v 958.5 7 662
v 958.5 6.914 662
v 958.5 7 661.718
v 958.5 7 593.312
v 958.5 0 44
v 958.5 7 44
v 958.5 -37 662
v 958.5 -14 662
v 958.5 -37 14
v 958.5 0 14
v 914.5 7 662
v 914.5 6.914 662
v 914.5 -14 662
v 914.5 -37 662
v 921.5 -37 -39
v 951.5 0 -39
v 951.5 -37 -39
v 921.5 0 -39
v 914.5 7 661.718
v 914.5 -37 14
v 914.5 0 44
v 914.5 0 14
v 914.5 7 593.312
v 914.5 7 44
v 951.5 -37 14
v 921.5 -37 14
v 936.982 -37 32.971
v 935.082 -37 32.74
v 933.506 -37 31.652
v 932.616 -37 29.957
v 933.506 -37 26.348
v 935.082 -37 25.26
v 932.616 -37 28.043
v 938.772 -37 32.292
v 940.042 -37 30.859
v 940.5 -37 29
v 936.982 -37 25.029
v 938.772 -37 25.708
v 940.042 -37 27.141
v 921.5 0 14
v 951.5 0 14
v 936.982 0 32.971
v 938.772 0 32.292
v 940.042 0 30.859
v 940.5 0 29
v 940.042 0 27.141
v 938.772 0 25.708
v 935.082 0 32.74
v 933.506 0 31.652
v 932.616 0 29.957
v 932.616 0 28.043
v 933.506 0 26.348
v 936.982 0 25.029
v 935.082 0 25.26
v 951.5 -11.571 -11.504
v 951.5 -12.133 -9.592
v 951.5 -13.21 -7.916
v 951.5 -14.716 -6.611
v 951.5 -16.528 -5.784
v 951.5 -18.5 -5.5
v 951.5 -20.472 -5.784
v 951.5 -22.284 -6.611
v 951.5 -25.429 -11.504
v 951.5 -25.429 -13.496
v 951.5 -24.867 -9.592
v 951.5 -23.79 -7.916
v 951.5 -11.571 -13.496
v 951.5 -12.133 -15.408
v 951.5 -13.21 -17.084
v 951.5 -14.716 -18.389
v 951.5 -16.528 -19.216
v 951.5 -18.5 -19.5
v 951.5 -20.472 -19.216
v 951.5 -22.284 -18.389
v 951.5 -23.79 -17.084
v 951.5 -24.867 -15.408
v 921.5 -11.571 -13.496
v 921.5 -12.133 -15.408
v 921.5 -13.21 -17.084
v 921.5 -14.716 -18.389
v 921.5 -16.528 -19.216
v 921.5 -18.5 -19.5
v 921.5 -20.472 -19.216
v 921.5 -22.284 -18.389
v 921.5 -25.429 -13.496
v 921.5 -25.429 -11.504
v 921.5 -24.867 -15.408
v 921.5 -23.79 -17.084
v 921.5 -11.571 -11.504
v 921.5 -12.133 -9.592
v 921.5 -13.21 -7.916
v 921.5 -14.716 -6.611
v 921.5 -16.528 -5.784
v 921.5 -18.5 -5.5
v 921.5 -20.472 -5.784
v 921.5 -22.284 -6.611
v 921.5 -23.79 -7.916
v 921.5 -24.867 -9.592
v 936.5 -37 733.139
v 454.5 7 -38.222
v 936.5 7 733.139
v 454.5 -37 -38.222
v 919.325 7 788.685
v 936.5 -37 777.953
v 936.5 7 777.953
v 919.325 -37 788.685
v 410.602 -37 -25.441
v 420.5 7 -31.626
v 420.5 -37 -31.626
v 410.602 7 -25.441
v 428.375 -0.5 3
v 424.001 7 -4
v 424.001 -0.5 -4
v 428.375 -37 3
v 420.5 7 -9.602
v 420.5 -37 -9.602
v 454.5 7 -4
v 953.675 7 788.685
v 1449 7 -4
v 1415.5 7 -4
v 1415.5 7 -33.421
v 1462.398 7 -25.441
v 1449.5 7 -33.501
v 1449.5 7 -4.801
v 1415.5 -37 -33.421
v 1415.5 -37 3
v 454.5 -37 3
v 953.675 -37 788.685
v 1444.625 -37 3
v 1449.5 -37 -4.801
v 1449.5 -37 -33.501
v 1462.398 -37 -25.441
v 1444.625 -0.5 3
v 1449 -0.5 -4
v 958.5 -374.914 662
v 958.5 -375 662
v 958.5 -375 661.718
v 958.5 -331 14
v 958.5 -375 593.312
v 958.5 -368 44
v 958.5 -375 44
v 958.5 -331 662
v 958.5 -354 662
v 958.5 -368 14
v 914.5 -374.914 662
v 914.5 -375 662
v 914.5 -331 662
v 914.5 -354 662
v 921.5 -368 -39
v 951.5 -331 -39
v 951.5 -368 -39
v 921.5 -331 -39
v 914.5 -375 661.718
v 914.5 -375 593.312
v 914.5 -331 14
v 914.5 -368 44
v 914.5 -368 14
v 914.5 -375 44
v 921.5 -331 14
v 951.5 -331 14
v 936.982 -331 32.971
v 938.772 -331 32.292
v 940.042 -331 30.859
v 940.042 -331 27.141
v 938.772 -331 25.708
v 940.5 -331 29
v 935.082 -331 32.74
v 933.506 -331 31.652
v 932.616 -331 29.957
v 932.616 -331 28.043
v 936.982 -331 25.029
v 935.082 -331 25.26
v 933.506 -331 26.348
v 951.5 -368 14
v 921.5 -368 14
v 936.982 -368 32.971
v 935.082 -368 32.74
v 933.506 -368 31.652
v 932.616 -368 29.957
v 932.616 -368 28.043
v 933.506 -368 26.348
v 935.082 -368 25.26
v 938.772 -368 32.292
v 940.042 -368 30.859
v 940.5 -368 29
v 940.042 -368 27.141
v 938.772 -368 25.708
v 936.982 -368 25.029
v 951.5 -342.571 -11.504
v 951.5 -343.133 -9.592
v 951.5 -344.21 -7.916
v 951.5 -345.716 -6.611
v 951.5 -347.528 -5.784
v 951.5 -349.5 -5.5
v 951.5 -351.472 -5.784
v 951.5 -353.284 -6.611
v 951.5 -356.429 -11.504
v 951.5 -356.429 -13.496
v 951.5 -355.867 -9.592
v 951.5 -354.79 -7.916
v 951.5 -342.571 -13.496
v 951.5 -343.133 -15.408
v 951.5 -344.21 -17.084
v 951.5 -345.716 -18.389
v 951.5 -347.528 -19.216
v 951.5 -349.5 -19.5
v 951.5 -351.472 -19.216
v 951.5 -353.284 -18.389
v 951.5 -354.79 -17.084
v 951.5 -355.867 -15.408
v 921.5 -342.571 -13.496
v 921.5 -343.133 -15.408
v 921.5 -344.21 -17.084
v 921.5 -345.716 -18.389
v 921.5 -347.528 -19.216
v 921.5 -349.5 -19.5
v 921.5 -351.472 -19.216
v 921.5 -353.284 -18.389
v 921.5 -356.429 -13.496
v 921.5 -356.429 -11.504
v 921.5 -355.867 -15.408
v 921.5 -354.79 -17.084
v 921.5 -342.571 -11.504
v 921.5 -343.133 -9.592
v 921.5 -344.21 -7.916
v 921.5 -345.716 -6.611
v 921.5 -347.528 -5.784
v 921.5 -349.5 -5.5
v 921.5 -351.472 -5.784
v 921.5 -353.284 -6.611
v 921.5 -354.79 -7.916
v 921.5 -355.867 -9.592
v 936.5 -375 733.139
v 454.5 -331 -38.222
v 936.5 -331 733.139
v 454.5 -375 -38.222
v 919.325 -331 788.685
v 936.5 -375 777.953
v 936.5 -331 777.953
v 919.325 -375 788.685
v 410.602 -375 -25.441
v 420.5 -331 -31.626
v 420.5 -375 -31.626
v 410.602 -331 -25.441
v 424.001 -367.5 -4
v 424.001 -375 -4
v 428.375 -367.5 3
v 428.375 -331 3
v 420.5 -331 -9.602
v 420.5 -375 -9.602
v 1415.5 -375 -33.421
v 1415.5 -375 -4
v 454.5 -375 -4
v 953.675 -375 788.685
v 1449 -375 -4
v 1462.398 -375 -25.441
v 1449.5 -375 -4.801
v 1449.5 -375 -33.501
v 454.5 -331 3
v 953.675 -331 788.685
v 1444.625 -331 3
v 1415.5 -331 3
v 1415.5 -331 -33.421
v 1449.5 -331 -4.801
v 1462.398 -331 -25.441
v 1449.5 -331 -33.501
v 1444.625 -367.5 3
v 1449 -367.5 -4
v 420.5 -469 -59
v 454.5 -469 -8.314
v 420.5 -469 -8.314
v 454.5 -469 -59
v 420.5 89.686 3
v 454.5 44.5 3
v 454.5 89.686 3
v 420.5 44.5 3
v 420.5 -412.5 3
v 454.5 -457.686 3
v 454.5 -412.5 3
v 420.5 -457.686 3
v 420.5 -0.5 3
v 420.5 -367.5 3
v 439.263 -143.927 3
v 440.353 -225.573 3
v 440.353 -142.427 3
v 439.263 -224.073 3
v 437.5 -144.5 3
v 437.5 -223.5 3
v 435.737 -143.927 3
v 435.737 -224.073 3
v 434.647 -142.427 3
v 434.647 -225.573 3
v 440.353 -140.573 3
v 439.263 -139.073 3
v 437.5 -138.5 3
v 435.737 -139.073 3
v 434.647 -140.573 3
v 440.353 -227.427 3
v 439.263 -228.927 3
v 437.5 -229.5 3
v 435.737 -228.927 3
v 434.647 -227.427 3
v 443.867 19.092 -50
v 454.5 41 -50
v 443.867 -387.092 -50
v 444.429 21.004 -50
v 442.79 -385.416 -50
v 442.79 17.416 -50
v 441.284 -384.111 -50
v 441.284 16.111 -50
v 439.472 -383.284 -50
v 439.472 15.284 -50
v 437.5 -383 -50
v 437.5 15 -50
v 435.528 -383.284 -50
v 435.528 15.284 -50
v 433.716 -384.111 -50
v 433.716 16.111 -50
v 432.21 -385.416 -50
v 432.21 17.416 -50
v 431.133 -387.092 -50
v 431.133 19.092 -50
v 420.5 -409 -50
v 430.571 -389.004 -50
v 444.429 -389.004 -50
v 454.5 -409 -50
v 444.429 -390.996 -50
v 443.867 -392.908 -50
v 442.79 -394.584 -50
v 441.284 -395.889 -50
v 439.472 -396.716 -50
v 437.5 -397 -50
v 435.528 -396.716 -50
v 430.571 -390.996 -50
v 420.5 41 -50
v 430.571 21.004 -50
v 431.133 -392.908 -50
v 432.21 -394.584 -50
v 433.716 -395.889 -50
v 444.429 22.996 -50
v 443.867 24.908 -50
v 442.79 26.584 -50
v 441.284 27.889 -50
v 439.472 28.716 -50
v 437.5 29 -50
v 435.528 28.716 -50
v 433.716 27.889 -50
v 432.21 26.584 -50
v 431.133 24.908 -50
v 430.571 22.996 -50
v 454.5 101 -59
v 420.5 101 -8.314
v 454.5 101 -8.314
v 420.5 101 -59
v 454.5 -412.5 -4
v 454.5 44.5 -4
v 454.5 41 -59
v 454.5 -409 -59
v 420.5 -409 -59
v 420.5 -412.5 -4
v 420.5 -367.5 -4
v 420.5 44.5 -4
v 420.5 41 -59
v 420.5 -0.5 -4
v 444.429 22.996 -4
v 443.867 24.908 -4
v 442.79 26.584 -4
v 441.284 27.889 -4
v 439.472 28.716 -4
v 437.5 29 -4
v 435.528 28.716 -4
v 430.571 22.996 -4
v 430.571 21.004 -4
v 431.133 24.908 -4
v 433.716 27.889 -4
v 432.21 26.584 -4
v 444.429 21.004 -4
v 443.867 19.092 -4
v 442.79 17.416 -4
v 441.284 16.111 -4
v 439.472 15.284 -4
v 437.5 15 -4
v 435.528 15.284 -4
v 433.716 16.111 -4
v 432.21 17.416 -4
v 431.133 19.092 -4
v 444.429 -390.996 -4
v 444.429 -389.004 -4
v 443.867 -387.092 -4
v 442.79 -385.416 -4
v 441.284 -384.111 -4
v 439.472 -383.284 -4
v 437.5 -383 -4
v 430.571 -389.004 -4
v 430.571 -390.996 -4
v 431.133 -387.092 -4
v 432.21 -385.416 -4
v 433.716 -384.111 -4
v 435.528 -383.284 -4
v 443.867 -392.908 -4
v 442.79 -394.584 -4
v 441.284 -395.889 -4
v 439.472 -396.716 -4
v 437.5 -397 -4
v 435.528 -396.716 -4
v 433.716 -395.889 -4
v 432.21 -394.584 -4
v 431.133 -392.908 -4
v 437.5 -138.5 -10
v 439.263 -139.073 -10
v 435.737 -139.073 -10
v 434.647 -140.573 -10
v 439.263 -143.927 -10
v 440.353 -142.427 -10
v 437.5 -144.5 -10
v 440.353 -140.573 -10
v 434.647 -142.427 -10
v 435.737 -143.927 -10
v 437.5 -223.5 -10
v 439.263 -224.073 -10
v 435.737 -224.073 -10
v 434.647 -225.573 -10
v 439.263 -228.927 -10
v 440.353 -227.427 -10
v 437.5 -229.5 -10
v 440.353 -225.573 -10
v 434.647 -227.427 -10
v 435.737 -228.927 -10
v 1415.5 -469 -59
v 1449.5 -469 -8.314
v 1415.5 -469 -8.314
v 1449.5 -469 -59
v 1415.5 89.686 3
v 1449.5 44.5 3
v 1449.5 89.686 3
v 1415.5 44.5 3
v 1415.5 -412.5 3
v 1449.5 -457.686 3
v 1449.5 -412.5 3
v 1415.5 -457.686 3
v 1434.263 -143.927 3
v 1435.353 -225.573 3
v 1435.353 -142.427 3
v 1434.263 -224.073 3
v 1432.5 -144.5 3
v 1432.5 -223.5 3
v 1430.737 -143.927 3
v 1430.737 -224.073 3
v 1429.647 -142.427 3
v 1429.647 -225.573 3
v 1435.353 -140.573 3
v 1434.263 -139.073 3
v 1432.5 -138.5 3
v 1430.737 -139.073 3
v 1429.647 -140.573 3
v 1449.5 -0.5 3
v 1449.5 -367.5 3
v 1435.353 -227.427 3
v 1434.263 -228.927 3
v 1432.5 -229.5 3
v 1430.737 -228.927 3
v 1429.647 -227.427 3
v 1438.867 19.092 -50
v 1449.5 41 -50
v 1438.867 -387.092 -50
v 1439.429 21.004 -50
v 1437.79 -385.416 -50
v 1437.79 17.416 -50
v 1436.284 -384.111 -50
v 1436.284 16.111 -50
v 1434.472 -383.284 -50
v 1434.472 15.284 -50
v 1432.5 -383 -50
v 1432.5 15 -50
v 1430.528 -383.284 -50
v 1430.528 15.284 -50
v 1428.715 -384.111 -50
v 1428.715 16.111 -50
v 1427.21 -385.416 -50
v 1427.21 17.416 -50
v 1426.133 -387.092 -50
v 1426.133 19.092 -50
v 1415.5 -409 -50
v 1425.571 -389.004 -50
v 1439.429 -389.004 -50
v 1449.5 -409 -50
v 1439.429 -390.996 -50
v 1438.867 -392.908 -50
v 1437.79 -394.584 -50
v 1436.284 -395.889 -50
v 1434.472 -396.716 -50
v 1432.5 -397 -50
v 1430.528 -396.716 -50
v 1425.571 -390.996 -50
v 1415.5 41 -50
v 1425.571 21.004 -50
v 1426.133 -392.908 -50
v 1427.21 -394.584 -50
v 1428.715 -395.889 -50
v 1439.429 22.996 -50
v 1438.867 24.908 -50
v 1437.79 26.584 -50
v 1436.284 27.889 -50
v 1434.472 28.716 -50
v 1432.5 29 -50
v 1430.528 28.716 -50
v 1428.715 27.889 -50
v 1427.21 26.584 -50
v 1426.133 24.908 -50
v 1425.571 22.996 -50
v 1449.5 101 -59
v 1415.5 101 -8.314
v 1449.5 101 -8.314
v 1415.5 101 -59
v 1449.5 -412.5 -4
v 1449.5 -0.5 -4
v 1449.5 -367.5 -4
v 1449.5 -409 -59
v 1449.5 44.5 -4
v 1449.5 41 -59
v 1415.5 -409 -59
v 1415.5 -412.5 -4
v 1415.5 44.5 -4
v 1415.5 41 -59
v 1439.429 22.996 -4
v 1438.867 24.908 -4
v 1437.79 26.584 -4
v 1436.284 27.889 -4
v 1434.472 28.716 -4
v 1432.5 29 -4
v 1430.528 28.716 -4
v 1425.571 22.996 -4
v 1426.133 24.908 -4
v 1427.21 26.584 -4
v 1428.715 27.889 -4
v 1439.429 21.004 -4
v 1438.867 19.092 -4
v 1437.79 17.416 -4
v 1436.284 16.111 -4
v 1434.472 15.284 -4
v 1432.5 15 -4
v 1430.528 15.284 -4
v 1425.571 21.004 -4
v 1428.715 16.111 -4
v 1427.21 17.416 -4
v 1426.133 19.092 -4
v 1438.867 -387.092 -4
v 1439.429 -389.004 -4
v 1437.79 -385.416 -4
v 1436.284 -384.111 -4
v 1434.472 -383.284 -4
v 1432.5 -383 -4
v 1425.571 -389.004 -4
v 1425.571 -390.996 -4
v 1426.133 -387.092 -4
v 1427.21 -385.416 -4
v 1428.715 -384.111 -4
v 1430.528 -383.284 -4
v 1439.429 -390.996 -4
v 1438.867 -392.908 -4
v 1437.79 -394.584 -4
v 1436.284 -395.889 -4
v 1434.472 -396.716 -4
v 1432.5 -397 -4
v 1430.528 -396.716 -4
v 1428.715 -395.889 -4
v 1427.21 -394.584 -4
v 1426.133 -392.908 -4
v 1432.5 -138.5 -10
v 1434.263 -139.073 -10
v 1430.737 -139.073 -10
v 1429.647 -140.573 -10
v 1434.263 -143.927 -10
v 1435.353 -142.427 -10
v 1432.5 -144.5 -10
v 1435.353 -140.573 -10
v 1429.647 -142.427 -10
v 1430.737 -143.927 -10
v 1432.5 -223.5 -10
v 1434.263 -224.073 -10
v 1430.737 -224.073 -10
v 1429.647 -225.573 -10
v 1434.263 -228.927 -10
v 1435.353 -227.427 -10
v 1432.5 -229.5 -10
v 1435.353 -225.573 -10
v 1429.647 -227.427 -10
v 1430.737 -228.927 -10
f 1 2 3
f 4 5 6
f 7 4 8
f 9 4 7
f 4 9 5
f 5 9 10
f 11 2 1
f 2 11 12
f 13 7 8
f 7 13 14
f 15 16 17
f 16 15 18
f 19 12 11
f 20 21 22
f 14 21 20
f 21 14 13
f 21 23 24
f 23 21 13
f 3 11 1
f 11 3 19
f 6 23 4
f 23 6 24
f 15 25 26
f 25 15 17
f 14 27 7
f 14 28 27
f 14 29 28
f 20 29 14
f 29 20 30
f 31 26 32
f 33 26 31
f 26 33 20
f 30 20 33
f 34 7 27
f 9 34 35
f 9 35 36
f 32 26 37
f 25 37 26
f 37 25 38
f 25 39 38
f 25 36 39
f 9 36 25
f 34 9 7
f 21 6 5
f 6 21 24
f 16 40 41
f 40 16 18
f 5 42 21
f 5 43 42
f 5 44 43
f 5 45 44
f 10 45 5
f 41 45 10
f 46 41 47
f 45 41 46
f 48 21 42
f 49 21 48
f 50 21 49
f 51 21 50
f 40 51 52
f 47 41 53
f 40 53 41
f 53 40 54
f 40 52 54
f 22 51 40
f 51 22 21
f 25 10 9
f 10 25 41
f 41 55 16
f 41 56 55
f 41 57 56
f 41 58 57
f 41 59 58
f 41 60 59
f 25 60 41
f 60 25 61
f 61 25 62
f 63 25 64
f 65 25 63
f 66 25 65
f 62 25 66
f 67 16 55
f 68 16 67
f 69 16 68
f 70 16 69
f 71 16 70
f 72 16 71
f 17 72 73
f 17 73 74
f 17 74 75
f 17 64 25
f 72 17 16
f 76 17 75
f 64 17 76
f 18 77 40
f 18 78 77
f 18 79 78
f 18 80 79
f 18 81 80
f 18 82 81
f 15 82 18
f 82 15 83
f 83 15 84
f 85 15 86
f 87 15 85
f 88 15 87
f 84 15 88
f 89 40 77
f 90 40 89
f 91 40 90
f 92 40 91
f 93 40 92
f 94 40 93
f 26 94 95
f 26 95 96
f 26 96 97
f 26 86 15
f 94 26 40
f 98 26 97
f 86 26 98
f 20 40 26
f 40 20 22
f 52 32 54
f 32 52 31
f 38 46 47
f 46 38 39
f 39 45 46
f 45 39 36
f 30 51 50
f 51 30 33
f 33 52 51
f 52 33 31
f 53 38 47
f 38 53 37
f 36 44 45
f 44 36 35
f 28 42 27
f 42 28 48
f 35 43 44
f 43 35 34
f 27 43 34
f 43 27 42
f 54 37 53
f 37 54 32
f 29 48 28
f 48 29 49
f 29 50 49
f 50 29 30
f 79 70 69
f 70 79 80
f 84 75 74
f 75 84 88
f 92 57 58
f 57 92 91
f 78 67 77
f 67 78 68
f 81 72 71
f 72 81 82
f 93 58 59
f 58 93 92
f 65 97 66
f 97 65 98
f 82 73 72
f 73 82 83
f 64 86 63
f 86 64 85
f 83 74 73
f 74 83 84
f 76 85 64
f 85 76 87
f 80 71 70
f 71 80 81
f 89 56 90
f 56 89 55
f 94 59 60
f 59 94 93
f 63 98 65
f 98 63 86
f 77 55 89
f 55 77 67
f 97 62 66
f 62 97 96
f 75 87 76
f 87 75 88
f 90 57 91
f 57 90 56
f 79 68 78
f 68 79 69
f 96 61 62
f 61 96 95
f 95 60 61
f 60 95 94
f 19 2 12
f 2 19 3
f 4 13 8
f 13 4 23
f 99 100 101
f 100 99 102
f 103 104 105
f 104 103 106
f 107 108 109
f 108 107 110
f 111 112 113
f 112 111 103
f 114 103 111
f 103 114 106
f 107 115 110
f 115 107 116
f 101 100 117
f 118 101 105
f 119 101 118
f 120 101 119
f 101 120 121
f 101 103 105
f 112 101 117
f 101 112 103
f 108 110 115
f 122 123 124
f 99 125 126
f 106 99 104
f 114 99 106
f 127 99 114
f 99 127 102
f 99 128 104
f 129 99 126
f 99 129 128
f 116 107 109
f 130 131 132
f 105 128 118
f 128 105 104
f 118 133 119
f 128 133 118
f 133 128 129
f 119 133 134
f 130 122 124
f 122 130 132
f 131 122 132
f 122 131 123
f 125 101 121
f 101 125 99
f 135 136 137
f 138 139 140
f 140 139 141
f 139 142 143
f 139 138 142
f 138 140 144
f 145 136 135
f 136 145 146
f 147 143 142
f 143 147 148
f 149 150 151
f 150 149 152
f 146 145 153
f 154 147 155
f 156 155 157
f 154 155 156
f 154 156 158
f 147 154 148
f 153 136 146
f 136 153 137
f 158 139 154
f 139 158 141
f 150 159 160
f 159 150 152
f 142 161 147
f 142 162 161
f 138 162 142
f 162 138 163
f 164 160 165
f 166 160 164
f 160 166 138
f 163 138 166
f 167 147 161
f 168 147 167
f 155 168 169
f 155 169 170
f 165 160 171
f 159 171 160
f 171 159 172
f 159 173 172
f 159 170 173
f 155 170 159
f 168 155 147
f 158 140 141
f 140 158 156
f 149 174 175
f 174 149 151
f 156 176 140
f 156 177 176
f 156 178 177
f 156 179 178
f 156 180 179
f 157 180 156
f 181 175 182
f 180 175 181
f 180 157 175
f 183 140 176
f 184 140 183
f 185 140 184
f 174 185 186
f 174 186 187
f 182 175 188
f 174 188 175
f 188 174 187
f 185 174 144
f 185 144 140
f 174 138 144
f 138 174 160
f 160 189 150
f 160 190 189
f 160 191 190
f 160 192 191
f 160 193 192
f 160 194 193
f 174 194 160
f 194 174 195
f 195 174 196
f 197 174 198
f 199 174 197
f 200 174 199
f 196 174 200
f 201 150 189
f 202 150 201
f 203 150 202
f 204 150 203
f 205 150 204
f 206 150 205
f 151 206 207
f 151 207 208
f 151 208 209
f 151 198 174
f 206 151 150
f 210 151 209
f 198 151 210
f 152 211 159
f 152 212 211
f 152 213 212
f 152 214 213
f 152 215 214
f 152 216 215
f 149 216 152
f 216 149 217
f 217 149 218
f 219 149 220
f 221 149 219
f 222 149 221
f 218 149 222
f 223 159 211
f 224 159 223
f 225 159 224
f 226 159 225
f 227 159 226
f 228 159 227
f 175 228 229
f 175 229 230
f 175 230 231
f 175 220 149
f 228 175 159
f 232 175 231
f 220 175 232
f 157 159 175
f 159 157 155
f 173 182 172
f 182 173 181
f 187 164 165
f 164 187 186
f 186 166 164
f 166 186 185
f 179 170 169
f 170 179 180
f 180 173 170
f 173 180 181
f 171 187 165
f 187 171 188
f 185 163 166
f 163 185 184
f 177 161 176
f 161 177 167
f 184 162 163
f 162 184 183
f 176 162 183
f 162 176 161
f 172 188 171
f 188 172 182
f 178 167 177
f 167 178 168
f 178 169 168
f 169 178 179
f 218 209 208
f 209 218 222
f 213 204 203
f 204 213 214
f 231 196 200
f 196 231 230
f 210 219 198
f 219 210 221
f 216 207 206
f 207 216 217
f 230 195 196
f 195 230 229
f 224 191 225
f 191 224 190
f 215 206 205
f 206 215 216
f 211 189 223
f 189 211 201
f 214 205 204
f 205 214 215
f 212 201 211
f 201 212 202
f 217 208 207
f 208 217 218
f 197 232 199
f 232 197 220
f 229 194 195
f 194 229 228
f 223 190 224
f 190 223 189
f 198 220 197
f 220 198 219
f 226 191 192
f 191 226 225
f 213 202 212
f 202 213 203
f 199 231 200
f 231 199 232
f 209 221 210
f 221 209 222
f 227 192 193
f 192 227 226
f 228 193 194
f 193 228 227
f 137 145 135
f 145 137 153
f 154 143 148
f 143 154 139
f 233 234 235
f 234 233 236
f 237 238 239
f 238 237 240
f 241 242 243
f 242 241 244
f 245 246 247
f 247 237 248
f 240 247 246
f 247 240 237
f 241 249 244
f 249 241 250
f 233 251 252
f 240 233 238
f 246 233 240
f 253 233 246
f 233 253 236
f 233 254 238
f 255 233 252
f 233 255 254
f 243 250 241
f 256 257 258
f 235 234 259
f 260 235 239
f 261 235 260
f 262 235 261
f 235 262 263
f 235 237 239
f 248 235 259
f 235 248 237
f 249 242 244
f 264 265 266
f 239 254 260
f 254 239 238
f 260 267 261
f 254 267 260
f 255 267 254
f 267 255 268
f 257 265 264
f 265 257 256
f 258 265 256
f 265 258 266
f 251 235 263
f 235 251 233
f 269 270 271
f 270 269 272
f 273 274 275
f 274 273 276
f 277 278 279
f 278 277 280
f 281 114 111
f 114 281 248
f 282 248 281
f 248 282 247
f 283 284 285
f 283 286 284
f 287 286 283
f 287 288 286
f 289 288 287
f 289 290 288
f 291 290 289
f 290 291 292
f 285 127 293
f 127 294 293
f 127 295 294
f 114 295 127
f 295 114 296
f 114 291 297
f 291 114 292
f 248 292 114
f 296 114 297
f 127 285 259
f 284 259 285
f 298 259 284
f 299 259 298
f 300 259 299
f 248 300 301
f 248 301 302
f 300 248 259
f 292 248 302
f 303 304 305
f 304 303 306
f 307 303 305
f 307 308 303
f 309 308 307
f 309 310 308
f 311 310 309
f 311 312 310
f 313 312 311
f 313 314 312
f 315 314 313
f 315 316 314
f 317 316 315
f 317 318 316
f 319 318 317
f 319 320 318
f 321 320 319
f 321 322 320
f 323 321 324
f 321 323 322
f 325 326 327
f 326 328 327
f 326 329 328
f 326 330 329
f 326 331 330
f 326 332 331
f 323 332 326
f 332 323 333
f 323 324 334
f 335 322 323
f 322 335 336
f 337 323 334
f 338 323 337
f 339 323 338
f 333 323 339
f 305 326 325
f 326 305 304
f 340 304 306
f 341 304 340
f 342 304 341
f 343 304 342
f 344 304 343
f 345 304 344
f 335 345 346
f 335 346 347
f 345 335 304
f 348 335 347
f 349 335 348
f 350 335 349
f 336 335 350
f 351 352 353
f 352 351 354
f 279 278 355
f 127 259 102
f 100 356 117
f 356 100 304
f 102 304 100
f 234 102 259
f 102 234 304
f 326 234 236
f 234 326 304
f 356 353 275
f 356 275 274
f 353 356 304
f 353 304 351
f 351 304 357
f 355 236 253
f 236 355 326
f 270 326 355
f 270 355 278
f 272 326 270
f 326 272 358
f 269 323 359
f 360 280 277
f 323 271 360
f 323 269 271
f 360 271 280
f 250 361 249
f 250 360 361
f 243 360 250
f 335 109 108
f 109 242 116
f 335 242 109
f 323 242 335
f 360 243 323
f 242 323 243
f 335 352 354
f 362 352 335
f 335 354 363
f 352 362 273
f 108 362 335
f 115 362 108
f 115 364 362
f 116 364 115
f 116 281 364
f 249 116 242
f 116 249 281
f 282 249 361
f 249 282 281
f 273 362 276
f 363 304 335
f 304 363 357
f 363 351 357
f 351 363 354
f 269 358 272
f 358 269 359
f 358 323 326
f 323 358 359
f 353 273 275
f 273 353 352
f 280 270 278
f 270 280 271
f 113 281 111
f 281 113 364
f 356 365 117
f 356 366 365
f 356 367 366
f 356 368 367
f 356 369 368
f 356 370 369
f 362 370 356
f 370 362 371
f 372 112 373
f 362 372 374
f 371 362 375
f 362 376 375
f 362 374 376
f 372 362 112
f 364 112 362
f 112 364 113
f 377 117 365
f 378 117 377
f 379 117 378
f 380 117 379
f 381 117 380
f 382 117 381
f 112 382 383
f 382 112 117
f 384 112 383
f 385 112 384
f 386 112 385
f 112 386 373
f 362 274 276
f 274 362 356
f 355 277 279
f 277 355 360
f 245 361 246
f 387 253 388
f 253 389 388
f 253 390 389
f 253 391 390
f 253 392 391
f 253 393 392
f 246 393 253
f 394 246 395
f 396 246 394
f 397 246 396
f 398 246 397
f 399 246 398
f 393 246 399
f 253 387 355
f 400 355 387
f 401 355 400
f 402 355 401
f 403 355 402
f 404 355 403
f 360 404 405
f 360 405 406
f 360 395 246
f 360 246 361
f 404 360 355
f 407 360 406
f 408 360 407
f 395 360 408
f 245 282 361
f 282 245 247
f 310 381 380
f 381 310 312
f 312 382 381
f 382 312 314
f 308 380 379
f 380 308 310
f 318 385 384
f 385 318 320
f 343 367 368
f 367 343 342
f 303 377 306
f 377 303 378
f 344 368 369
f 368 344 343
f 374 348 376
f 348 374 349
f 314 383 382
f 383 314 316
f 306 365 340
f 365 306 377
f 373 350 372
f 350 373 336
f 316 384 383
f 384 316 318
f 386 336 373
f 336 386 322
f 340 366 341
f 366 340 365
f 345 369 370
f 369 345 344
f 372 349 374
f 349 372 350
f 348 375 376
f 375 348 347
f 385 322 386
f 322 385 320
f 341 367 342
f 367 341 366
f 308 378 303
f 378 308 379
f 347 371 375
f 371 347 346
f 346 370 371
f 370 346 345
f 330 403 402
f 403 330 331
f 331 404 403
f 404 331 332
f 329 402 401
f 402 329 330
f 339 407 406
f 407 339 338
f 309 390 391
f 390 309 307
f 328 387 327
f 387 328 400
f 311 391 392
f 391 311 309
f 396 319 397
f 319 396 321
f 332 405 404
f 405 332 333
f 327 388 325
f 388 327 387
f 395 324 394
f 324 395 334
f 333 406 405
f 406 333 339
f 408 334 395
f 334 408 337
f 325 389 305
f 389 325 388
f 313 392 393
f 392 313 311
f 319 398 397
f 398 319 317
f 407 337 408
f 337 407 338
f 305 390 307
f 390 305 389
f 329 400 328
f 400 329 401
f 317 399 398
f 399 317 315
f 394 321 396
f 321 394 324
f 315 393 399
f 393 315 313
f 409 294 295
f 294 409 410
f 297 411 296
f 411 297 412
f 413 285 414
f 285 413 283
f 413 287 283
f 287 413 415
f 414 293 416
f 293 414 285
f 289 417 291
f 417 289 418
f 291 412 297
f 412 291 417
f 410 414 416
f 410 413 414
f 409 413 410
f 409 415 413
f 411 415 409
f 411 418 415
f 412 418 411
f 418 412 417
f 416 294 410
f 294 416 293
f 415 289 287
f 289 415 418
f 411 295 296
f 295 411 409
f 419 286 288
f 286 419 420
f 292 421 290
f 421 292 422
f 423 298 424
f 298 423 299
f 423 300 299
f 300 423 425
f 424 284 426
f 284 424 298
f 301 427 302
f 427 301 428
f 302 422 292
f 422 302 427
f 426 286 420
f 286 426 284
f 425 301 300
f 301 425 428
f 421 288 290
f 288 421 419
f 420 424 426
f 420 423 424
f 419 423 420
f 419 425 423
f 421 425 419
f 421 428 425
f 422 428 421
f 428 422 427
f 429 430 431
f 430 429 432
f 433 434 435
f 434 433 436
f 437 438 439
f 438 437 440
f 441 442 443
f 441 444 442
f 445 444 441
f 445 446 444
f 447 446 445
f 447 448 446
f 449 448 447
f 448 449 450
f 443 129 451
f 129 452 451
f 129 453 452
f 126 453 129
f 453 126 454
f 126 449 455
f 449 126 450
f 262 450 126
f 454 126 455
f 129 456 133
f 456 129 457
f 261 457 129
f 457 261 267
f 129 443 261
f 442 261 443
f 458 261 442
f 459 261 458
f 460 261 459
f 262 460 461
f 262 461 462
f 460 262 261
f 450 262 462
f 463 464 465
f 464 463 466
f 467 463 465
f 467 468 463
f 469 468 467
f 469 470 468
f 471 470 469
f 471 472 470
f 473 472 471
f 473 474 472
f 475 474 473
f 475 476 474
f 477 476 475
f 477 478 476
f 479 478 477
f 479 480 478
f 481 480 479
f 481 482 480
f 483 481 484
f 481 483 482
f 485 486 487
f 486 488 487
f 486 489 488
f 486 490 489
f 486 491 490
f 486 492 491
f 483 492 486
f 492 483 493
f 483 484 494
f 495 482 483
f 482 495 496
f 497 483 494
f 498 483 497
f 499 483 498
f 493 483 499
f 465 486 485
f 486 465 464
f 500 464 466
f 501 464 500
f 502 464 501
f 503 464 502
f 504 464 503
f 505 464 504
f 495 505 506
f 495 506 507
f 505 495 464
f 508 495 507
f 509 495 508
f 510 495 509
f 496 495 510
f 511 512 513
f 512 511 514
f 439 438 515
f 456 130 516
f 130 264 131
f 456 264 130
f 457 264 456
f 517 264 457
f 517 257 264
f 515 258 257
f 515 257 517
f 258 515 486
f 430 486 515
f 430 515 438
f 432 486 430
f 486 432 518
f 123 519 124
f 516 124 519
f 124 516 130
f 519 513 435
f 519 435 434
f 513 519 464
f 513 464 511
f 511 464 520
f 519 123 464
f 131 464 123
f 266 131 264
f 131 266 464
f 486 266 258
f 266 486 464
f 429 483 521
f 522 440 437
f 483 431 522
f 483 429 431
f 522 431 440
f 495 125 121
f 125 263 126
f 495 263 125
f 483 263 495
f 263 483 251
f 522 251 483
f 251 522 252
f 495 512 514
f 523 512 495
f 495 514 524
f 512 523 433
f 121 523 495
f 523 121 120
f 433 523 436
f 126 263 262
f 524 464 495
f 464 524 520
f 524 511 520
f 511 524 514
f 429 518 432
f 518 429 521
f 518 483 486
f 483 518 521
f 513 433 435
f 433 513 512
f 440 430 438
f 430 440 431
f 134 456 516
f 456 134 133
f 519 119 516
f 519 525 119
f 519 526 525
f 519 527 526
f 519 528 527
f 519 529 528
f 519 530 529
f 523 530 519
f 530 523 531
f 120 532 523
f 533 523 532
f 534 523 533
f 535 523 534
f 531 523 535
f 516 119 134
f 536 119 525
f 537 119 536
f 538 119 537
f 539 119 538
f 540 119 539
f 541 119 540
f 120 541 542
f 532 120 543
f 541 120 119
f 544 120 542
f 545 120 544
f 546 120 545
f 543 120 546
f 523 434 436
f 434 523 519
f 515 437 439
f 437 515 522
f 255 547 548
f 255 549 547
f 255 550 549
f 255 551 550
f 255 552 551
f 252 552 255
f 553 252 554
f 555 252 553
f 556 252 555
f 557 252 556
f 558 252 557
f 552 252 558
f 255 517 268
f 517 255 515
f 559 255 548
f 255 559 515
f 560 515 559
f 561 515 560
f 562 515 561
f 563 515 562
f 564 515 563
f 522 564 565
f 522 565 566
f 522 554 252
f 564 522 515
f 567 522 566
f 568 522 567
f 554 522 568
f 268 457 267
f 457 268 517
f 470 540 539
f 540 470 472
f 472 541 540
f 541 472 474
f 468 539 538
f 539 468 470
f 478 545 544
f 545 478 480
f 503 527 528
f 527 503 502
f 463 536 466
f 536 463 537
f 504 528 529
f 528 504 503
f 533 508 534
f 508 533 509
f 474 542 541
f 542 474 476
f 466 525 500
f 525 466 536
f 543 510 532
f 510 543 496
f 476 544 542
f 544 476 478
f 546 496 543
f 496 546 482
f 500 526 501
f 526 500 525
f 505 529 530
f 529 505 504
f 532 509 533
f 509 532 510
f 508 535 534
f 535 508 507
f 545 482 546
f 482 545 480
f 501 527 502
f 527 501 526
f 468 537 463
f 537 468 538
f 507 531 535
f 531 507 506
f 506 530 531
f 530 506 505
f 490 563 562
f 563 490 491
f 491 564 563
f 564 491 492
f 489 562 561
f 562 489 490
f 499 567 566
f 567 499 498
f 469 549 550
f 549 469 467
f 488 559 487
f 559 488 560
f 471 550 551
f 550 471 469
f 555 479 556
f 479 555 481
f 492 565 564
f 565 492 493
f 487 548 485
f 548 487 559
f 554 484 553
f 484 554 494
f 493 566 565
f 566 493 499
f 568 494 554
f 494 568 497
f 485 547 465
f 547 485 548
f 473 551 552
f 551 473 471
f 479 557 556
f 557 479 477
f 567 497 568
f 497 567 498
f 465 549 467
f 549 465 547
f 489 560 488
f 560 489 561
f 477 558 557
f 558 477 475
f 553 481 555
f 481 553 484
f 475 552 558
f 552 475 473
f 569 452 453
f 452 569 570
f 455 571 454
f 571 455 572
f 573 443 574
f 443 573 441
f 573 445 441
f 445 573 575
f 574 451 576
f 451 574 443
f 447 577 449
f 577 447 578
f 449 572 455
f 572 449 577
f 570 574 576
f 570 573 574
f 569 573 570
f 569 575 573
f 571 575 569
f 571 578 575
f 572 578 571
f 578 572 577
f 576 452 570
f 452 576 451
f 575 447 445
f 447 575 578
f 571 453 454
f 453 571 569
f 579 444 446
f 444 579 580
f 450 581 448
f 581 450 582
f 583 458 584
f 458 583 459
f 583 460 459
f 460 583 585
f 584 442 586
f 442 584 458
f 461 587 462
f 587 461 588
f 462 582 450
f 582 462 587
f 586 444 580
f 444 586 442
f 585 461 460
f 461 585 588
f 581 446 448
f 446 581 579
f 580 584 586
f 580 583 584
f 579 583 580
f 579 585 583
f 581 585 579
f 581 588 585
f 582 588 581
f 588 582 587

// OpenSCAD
// (c) 2014 juewei@fabfolk.com
// GPLv2.0 or ask.

frame_width=412;
bar_l1=570;
bar_l2=980;
side_x=220;
side_alpha=17;
side_beta=32;
x1=(bar_l1-frame_width)/2;
x2=(bar_l2-frame_width)/2;
d1=8;		// bolt diameter for gluing struts

side_x_center =   (988+885)/2;
center_pocket_w =  988-885;
pocket_depth = 	7;
explode = 0;		// descend all the bottom bars

module rcube_xy(size, radius) 
{
  x = size[0];
  y = size[1];
  z = size[2];

  linear_extrude(height=z) hull() 
    {
      translate([radius, radius, 0])
      circle(r=radius);

      translate([x - radius, radius, 0])
      circle(r=radius);

      translate([x - radius, y - radius, 0])
      circle(r=radius);

      translate([radius, y - radius, 0])
      circle(r=radius);
    }
}

module lower_beam()
{
  lhl=1500;	// length of lower beam 
  difference()
    {
      cube([lhl,44,44]);		// lower lengthwise beam
      // cut back edges
                            rotate([0,-45,0])  translate([0,-10,-10]) cube([8,60,20]);
      translate([0,0,45])   rotate([0,45,0])   translate([0,-10,-10]) cube([8,60,20]);
      translate([lhl,0,45]) rotate([0,135,0])  translate([0,-10,-10]) cube([8,60,20]);
      translate([lhl,0,0])  rotate([0,-135,0]) translate([0,-10,-10]) cube([8,60,20]);
    
      // hole for rear round bar
      rotate([-90,0,0]) translate([45,-22,-10]) cylinder(60,8,8); 

      // Pocket for bottom bar rear
      translate([420, -10, -10]) cube([35, 60, 10+pocket_depth]);
      // Hole for bottom bar rear	
      translate([420+35/2, 22, 0]) cylinder(50, 7,7);
      // 480?? Hole for bolting rear strut
      rotate([-90,0,0]) translate([480,-22,-10]) cylinder(60,d1/2,d1/2); 

      // Pocket for bottom bars center
      translate([side_x_center-center_pocket_w/2, -10, -10]) cube([center_pocket_w, 60, 10+pocket_depth]);		
      // hole for bolting center post
      rotate([-90,0,0]) translate([side_x_center,-22-pocket_depth,-10]) cylinder(60,d1/2,d1/2);     

      // Pocket for bottom bar front
      translate([1415, -10, -10]) cube([35, 60, 10+pocket_depth]);
      // Hole for bottom bar front	
      translate([1415+37/2, 22, 0]) cylinder(50, 7,7);
      // 1400?? Hole for bolting front strut
      rotate([-90,0,0]) translate([1400,-22,-10]) cylinder(60,d1/2,d1/2); 
    }
}

module wedge15(len)
{
  difference()
    {
      rotate([0,-15,0]) translate([0,0,-44]) cube([len,44,44]);
      translate([0,-10,-44]) cube([2*len, 60,44]);
    }
}

module side_support()
{
  lss=1248;	// Length side support
  d1=8;		// bolt diameter for gluing struts
  translate([-lss,0,0]) difference()
    {
      union()
        {
          cube([lss,44,44]);		// side support
          translate([0,0,44.2]) wedge15(106);  //hypothenusis=110
          translate([413,0,44.2]) wedge15(92); //hypothenusis=95
		
        }
      // Hole for main shaft
      rotate([0,-side_alpha,0]) translate([60,22,-30]) cylinder(100,8,8); 
      
      // Slanted ends
      translate([0,0,44])  rotate([0,180-side_alpha,0]) translate([0,-10,-10]) cube([15,60,60]);
      translate([lss,0,0]) rotate([0,-side_alpha,0])    translate([0,-10,-10]) cube([15,60,60]);

      // Hole for upper triangle bolt
      rotate([-90,0,0]) translate([472,-38,-10]) cylinder(60,7,7); 

      // pockets for bottom center bars
      translate([1193,-10, 0]) rotate([0,-side_alpha,0]) translate([0,0,-20]) cube([60,10+pocket_depth,80]);
      translate([1193,44-7,0]) rotate([0,-side_alpha,0]) translate([0,0,-20]) cube([60,10+pocket_depth,80]);

      // Hole for bottom center bars bolt
      rotate([-90,0,0]) translate([1214,-22,-10]) cylinder(60,7,7); 
    }
}

module bottom_center_bar()
{
  xc1 = bar_l2/2-frame_width/2;
  xc2 = bar_l2/2+frame_width/2;
  difference()
    {
      cube([bar_l2,34,53]);

      // cut back edges
      translate([0,     0,53]) rotate([0,45,0])   translate([0,-10,-10]) cube([8,60,20]);
      translate([bar_l2,0,53]) rotate([0,135,0])  translate([0,-10,-10]) cube([8,60,20]);
      
      // lower beam pockets
      translate([x2-45/2,            -10,53-7]) cube([45, 60, 10+pocket_depth]);
      translate([x2-45/2+frame_width,-10,53-7]) cube([45, 60, 10+pocket_depth]);

      // holes for center posts
      rotate([-90,0,0]) translate([xc1+(44+44-pocket_depth)/2, -53/2,-10]) cylinder(60,7,7); 
      rotate([-90,0,0]) translate([xc2-(44+44-pocket_depth)/2, -53/2,-10]) cylinder(60,7,7); 

      // holes for side supports
      rotate([-90,0,0]) translate([x2-side_x+8,            -53/2,-10]) cylinder(60,7,7); 
      rotate([-90,0,0]) translate([x2+frame_width+side_x-8,-53/2,-10]) cylinder(60,7,7); 

    }
}

module bottom_bar()
  {
    x2=(bar_l1-85)/2;
    difference()
      {
	union()
	  {
	    cube([bar_l1,34,53]);
	    translate([0,0,-9]) cube([60,34,9]);
	    translate([bar_l1-60,0,-9]) cube([60,34,9]);
	  }
	// cut back edges
	translate([0,     0,53]) rotate([0,45,0])   translate([0,-10,-10]) cube([8,60,20]);
	translate([bar_l1,0,53]) rotate([0,135,0])  translate([0,-10,-10]) cube([8,60,20]);

	// beam pockets
	translate([x1-45/2,            -10,53-pocket_depth]) cube([45,50,10+pocket_depth]);
	translate([x1-45/2+frame_width,-10,53-pocket_depth]) cube([45,50,10+pocket_depth]);

	// beam holes
	translate([x1,            34/2,-10]) cylinder(60,7,7); 
	translate([x1+frame_width,34/2,-10]) cylinder(60,7,7); 

	// pin holes for slide
	translate([x2,34/2,   40]) cylinder(25,3,3); 
	translate([x2+85,34/2,40]) cylinder(25,3,3); 
      } 
  }

module triangle_post()
{
    translate([0,-44+pocket_depth,-30]) cube([44,44,960]);
}

module center_post()
  {
    h=618;
    difference()
      {
	translate([0,-44+pocket_depth,-53+2*pocket_depth]) cube([44,44,h+44-2*pocket_depth+53]);

	// three sides pockets at the bottom end:
	translate([-10,0,-53+2*pocket_depth-10]) cube([44+10+10,pocket_depth+10,53+44-2*pocket_depth+10]);
	translate([-pocket_depth+44,-44-10,-53+2*pocket_depth-10]) cube([pocket_depth+10,44+10+10,53+10]);
	translate([-10,-44-10,-53+2*pocket_depth-10]) cube([pocket_depth+10,44+10+10,53+10]);

        // hole for bolting center post, glued to lower_beam.
        rotate([-90,0,0]) translate([22,-22-pocket_depth,-44]) cylinder(60,d1/2,d1/2);     

        // hole for bolting center post with center bottom bars
        translate([-10, -(44-pocket_depth)/2, -53/2+2*pocket_depth]) rotate([0,90,0]) cylinder(60,7,7); 

	// tapered top
	translate([-10,-44+pocket_depth+23,h+44]) rotate([-90+side_alpha,0,0]) cube([60,80,20]);
      }
  }


module side_triangle()
{
  tri_width = 510;
  union()
    {
      %lower_beam();
      translate([side_x_center-tri_width,0,0])                 rotate([0,side_beta,0]) triangle_post();
      translate([side_x_center+tri_width,0,0]) scale([-1,1,1]) rotate([0,side_beta,0]) triangle_post();
      translate([side_x_center-22,0,0]) rotate([0,00,0]) center_post();
    }
}


#side_triangle();
translate([0,-frame_width+44,0]) scale([1,-1,1]) side_triangle();

translate([420.5,x1+44/2,-50]) rotate([0,0,-90]) bottom_bar();  // rear bar
translate([1415.5,x1+44/2,-50]) rotate([0,0,-90]) bottom_bar(); // front bar

%translate([side_x_center-center_pocket_w/2,   x2+44/2,-53+2*pocket_depth-explode]) rotate([0,0,-90]) bottom_center_bar();  // rear c bar
%translate([side_x_center+center_pocket_w/2-34,x2+44/2,-53+2*pocket_depth-explode]) rotate([0,0,-90]) bottom_center_bar();  // front c bar


% translate([side_x_center-22,          44+220,-53+7]) rotate([0,90+side_alpha,-90]) side_support();
% translate([side_x_center+22,-frame_width-220,-53+7]) rotate([0,90+side_alpha, 90]) side_support();

// rcube_xy([100,100,100],20);
// translate([0,0,100])rcube_xy([100,100,100],40);
// translate([0,0,-100])cube([100,100,100]);
